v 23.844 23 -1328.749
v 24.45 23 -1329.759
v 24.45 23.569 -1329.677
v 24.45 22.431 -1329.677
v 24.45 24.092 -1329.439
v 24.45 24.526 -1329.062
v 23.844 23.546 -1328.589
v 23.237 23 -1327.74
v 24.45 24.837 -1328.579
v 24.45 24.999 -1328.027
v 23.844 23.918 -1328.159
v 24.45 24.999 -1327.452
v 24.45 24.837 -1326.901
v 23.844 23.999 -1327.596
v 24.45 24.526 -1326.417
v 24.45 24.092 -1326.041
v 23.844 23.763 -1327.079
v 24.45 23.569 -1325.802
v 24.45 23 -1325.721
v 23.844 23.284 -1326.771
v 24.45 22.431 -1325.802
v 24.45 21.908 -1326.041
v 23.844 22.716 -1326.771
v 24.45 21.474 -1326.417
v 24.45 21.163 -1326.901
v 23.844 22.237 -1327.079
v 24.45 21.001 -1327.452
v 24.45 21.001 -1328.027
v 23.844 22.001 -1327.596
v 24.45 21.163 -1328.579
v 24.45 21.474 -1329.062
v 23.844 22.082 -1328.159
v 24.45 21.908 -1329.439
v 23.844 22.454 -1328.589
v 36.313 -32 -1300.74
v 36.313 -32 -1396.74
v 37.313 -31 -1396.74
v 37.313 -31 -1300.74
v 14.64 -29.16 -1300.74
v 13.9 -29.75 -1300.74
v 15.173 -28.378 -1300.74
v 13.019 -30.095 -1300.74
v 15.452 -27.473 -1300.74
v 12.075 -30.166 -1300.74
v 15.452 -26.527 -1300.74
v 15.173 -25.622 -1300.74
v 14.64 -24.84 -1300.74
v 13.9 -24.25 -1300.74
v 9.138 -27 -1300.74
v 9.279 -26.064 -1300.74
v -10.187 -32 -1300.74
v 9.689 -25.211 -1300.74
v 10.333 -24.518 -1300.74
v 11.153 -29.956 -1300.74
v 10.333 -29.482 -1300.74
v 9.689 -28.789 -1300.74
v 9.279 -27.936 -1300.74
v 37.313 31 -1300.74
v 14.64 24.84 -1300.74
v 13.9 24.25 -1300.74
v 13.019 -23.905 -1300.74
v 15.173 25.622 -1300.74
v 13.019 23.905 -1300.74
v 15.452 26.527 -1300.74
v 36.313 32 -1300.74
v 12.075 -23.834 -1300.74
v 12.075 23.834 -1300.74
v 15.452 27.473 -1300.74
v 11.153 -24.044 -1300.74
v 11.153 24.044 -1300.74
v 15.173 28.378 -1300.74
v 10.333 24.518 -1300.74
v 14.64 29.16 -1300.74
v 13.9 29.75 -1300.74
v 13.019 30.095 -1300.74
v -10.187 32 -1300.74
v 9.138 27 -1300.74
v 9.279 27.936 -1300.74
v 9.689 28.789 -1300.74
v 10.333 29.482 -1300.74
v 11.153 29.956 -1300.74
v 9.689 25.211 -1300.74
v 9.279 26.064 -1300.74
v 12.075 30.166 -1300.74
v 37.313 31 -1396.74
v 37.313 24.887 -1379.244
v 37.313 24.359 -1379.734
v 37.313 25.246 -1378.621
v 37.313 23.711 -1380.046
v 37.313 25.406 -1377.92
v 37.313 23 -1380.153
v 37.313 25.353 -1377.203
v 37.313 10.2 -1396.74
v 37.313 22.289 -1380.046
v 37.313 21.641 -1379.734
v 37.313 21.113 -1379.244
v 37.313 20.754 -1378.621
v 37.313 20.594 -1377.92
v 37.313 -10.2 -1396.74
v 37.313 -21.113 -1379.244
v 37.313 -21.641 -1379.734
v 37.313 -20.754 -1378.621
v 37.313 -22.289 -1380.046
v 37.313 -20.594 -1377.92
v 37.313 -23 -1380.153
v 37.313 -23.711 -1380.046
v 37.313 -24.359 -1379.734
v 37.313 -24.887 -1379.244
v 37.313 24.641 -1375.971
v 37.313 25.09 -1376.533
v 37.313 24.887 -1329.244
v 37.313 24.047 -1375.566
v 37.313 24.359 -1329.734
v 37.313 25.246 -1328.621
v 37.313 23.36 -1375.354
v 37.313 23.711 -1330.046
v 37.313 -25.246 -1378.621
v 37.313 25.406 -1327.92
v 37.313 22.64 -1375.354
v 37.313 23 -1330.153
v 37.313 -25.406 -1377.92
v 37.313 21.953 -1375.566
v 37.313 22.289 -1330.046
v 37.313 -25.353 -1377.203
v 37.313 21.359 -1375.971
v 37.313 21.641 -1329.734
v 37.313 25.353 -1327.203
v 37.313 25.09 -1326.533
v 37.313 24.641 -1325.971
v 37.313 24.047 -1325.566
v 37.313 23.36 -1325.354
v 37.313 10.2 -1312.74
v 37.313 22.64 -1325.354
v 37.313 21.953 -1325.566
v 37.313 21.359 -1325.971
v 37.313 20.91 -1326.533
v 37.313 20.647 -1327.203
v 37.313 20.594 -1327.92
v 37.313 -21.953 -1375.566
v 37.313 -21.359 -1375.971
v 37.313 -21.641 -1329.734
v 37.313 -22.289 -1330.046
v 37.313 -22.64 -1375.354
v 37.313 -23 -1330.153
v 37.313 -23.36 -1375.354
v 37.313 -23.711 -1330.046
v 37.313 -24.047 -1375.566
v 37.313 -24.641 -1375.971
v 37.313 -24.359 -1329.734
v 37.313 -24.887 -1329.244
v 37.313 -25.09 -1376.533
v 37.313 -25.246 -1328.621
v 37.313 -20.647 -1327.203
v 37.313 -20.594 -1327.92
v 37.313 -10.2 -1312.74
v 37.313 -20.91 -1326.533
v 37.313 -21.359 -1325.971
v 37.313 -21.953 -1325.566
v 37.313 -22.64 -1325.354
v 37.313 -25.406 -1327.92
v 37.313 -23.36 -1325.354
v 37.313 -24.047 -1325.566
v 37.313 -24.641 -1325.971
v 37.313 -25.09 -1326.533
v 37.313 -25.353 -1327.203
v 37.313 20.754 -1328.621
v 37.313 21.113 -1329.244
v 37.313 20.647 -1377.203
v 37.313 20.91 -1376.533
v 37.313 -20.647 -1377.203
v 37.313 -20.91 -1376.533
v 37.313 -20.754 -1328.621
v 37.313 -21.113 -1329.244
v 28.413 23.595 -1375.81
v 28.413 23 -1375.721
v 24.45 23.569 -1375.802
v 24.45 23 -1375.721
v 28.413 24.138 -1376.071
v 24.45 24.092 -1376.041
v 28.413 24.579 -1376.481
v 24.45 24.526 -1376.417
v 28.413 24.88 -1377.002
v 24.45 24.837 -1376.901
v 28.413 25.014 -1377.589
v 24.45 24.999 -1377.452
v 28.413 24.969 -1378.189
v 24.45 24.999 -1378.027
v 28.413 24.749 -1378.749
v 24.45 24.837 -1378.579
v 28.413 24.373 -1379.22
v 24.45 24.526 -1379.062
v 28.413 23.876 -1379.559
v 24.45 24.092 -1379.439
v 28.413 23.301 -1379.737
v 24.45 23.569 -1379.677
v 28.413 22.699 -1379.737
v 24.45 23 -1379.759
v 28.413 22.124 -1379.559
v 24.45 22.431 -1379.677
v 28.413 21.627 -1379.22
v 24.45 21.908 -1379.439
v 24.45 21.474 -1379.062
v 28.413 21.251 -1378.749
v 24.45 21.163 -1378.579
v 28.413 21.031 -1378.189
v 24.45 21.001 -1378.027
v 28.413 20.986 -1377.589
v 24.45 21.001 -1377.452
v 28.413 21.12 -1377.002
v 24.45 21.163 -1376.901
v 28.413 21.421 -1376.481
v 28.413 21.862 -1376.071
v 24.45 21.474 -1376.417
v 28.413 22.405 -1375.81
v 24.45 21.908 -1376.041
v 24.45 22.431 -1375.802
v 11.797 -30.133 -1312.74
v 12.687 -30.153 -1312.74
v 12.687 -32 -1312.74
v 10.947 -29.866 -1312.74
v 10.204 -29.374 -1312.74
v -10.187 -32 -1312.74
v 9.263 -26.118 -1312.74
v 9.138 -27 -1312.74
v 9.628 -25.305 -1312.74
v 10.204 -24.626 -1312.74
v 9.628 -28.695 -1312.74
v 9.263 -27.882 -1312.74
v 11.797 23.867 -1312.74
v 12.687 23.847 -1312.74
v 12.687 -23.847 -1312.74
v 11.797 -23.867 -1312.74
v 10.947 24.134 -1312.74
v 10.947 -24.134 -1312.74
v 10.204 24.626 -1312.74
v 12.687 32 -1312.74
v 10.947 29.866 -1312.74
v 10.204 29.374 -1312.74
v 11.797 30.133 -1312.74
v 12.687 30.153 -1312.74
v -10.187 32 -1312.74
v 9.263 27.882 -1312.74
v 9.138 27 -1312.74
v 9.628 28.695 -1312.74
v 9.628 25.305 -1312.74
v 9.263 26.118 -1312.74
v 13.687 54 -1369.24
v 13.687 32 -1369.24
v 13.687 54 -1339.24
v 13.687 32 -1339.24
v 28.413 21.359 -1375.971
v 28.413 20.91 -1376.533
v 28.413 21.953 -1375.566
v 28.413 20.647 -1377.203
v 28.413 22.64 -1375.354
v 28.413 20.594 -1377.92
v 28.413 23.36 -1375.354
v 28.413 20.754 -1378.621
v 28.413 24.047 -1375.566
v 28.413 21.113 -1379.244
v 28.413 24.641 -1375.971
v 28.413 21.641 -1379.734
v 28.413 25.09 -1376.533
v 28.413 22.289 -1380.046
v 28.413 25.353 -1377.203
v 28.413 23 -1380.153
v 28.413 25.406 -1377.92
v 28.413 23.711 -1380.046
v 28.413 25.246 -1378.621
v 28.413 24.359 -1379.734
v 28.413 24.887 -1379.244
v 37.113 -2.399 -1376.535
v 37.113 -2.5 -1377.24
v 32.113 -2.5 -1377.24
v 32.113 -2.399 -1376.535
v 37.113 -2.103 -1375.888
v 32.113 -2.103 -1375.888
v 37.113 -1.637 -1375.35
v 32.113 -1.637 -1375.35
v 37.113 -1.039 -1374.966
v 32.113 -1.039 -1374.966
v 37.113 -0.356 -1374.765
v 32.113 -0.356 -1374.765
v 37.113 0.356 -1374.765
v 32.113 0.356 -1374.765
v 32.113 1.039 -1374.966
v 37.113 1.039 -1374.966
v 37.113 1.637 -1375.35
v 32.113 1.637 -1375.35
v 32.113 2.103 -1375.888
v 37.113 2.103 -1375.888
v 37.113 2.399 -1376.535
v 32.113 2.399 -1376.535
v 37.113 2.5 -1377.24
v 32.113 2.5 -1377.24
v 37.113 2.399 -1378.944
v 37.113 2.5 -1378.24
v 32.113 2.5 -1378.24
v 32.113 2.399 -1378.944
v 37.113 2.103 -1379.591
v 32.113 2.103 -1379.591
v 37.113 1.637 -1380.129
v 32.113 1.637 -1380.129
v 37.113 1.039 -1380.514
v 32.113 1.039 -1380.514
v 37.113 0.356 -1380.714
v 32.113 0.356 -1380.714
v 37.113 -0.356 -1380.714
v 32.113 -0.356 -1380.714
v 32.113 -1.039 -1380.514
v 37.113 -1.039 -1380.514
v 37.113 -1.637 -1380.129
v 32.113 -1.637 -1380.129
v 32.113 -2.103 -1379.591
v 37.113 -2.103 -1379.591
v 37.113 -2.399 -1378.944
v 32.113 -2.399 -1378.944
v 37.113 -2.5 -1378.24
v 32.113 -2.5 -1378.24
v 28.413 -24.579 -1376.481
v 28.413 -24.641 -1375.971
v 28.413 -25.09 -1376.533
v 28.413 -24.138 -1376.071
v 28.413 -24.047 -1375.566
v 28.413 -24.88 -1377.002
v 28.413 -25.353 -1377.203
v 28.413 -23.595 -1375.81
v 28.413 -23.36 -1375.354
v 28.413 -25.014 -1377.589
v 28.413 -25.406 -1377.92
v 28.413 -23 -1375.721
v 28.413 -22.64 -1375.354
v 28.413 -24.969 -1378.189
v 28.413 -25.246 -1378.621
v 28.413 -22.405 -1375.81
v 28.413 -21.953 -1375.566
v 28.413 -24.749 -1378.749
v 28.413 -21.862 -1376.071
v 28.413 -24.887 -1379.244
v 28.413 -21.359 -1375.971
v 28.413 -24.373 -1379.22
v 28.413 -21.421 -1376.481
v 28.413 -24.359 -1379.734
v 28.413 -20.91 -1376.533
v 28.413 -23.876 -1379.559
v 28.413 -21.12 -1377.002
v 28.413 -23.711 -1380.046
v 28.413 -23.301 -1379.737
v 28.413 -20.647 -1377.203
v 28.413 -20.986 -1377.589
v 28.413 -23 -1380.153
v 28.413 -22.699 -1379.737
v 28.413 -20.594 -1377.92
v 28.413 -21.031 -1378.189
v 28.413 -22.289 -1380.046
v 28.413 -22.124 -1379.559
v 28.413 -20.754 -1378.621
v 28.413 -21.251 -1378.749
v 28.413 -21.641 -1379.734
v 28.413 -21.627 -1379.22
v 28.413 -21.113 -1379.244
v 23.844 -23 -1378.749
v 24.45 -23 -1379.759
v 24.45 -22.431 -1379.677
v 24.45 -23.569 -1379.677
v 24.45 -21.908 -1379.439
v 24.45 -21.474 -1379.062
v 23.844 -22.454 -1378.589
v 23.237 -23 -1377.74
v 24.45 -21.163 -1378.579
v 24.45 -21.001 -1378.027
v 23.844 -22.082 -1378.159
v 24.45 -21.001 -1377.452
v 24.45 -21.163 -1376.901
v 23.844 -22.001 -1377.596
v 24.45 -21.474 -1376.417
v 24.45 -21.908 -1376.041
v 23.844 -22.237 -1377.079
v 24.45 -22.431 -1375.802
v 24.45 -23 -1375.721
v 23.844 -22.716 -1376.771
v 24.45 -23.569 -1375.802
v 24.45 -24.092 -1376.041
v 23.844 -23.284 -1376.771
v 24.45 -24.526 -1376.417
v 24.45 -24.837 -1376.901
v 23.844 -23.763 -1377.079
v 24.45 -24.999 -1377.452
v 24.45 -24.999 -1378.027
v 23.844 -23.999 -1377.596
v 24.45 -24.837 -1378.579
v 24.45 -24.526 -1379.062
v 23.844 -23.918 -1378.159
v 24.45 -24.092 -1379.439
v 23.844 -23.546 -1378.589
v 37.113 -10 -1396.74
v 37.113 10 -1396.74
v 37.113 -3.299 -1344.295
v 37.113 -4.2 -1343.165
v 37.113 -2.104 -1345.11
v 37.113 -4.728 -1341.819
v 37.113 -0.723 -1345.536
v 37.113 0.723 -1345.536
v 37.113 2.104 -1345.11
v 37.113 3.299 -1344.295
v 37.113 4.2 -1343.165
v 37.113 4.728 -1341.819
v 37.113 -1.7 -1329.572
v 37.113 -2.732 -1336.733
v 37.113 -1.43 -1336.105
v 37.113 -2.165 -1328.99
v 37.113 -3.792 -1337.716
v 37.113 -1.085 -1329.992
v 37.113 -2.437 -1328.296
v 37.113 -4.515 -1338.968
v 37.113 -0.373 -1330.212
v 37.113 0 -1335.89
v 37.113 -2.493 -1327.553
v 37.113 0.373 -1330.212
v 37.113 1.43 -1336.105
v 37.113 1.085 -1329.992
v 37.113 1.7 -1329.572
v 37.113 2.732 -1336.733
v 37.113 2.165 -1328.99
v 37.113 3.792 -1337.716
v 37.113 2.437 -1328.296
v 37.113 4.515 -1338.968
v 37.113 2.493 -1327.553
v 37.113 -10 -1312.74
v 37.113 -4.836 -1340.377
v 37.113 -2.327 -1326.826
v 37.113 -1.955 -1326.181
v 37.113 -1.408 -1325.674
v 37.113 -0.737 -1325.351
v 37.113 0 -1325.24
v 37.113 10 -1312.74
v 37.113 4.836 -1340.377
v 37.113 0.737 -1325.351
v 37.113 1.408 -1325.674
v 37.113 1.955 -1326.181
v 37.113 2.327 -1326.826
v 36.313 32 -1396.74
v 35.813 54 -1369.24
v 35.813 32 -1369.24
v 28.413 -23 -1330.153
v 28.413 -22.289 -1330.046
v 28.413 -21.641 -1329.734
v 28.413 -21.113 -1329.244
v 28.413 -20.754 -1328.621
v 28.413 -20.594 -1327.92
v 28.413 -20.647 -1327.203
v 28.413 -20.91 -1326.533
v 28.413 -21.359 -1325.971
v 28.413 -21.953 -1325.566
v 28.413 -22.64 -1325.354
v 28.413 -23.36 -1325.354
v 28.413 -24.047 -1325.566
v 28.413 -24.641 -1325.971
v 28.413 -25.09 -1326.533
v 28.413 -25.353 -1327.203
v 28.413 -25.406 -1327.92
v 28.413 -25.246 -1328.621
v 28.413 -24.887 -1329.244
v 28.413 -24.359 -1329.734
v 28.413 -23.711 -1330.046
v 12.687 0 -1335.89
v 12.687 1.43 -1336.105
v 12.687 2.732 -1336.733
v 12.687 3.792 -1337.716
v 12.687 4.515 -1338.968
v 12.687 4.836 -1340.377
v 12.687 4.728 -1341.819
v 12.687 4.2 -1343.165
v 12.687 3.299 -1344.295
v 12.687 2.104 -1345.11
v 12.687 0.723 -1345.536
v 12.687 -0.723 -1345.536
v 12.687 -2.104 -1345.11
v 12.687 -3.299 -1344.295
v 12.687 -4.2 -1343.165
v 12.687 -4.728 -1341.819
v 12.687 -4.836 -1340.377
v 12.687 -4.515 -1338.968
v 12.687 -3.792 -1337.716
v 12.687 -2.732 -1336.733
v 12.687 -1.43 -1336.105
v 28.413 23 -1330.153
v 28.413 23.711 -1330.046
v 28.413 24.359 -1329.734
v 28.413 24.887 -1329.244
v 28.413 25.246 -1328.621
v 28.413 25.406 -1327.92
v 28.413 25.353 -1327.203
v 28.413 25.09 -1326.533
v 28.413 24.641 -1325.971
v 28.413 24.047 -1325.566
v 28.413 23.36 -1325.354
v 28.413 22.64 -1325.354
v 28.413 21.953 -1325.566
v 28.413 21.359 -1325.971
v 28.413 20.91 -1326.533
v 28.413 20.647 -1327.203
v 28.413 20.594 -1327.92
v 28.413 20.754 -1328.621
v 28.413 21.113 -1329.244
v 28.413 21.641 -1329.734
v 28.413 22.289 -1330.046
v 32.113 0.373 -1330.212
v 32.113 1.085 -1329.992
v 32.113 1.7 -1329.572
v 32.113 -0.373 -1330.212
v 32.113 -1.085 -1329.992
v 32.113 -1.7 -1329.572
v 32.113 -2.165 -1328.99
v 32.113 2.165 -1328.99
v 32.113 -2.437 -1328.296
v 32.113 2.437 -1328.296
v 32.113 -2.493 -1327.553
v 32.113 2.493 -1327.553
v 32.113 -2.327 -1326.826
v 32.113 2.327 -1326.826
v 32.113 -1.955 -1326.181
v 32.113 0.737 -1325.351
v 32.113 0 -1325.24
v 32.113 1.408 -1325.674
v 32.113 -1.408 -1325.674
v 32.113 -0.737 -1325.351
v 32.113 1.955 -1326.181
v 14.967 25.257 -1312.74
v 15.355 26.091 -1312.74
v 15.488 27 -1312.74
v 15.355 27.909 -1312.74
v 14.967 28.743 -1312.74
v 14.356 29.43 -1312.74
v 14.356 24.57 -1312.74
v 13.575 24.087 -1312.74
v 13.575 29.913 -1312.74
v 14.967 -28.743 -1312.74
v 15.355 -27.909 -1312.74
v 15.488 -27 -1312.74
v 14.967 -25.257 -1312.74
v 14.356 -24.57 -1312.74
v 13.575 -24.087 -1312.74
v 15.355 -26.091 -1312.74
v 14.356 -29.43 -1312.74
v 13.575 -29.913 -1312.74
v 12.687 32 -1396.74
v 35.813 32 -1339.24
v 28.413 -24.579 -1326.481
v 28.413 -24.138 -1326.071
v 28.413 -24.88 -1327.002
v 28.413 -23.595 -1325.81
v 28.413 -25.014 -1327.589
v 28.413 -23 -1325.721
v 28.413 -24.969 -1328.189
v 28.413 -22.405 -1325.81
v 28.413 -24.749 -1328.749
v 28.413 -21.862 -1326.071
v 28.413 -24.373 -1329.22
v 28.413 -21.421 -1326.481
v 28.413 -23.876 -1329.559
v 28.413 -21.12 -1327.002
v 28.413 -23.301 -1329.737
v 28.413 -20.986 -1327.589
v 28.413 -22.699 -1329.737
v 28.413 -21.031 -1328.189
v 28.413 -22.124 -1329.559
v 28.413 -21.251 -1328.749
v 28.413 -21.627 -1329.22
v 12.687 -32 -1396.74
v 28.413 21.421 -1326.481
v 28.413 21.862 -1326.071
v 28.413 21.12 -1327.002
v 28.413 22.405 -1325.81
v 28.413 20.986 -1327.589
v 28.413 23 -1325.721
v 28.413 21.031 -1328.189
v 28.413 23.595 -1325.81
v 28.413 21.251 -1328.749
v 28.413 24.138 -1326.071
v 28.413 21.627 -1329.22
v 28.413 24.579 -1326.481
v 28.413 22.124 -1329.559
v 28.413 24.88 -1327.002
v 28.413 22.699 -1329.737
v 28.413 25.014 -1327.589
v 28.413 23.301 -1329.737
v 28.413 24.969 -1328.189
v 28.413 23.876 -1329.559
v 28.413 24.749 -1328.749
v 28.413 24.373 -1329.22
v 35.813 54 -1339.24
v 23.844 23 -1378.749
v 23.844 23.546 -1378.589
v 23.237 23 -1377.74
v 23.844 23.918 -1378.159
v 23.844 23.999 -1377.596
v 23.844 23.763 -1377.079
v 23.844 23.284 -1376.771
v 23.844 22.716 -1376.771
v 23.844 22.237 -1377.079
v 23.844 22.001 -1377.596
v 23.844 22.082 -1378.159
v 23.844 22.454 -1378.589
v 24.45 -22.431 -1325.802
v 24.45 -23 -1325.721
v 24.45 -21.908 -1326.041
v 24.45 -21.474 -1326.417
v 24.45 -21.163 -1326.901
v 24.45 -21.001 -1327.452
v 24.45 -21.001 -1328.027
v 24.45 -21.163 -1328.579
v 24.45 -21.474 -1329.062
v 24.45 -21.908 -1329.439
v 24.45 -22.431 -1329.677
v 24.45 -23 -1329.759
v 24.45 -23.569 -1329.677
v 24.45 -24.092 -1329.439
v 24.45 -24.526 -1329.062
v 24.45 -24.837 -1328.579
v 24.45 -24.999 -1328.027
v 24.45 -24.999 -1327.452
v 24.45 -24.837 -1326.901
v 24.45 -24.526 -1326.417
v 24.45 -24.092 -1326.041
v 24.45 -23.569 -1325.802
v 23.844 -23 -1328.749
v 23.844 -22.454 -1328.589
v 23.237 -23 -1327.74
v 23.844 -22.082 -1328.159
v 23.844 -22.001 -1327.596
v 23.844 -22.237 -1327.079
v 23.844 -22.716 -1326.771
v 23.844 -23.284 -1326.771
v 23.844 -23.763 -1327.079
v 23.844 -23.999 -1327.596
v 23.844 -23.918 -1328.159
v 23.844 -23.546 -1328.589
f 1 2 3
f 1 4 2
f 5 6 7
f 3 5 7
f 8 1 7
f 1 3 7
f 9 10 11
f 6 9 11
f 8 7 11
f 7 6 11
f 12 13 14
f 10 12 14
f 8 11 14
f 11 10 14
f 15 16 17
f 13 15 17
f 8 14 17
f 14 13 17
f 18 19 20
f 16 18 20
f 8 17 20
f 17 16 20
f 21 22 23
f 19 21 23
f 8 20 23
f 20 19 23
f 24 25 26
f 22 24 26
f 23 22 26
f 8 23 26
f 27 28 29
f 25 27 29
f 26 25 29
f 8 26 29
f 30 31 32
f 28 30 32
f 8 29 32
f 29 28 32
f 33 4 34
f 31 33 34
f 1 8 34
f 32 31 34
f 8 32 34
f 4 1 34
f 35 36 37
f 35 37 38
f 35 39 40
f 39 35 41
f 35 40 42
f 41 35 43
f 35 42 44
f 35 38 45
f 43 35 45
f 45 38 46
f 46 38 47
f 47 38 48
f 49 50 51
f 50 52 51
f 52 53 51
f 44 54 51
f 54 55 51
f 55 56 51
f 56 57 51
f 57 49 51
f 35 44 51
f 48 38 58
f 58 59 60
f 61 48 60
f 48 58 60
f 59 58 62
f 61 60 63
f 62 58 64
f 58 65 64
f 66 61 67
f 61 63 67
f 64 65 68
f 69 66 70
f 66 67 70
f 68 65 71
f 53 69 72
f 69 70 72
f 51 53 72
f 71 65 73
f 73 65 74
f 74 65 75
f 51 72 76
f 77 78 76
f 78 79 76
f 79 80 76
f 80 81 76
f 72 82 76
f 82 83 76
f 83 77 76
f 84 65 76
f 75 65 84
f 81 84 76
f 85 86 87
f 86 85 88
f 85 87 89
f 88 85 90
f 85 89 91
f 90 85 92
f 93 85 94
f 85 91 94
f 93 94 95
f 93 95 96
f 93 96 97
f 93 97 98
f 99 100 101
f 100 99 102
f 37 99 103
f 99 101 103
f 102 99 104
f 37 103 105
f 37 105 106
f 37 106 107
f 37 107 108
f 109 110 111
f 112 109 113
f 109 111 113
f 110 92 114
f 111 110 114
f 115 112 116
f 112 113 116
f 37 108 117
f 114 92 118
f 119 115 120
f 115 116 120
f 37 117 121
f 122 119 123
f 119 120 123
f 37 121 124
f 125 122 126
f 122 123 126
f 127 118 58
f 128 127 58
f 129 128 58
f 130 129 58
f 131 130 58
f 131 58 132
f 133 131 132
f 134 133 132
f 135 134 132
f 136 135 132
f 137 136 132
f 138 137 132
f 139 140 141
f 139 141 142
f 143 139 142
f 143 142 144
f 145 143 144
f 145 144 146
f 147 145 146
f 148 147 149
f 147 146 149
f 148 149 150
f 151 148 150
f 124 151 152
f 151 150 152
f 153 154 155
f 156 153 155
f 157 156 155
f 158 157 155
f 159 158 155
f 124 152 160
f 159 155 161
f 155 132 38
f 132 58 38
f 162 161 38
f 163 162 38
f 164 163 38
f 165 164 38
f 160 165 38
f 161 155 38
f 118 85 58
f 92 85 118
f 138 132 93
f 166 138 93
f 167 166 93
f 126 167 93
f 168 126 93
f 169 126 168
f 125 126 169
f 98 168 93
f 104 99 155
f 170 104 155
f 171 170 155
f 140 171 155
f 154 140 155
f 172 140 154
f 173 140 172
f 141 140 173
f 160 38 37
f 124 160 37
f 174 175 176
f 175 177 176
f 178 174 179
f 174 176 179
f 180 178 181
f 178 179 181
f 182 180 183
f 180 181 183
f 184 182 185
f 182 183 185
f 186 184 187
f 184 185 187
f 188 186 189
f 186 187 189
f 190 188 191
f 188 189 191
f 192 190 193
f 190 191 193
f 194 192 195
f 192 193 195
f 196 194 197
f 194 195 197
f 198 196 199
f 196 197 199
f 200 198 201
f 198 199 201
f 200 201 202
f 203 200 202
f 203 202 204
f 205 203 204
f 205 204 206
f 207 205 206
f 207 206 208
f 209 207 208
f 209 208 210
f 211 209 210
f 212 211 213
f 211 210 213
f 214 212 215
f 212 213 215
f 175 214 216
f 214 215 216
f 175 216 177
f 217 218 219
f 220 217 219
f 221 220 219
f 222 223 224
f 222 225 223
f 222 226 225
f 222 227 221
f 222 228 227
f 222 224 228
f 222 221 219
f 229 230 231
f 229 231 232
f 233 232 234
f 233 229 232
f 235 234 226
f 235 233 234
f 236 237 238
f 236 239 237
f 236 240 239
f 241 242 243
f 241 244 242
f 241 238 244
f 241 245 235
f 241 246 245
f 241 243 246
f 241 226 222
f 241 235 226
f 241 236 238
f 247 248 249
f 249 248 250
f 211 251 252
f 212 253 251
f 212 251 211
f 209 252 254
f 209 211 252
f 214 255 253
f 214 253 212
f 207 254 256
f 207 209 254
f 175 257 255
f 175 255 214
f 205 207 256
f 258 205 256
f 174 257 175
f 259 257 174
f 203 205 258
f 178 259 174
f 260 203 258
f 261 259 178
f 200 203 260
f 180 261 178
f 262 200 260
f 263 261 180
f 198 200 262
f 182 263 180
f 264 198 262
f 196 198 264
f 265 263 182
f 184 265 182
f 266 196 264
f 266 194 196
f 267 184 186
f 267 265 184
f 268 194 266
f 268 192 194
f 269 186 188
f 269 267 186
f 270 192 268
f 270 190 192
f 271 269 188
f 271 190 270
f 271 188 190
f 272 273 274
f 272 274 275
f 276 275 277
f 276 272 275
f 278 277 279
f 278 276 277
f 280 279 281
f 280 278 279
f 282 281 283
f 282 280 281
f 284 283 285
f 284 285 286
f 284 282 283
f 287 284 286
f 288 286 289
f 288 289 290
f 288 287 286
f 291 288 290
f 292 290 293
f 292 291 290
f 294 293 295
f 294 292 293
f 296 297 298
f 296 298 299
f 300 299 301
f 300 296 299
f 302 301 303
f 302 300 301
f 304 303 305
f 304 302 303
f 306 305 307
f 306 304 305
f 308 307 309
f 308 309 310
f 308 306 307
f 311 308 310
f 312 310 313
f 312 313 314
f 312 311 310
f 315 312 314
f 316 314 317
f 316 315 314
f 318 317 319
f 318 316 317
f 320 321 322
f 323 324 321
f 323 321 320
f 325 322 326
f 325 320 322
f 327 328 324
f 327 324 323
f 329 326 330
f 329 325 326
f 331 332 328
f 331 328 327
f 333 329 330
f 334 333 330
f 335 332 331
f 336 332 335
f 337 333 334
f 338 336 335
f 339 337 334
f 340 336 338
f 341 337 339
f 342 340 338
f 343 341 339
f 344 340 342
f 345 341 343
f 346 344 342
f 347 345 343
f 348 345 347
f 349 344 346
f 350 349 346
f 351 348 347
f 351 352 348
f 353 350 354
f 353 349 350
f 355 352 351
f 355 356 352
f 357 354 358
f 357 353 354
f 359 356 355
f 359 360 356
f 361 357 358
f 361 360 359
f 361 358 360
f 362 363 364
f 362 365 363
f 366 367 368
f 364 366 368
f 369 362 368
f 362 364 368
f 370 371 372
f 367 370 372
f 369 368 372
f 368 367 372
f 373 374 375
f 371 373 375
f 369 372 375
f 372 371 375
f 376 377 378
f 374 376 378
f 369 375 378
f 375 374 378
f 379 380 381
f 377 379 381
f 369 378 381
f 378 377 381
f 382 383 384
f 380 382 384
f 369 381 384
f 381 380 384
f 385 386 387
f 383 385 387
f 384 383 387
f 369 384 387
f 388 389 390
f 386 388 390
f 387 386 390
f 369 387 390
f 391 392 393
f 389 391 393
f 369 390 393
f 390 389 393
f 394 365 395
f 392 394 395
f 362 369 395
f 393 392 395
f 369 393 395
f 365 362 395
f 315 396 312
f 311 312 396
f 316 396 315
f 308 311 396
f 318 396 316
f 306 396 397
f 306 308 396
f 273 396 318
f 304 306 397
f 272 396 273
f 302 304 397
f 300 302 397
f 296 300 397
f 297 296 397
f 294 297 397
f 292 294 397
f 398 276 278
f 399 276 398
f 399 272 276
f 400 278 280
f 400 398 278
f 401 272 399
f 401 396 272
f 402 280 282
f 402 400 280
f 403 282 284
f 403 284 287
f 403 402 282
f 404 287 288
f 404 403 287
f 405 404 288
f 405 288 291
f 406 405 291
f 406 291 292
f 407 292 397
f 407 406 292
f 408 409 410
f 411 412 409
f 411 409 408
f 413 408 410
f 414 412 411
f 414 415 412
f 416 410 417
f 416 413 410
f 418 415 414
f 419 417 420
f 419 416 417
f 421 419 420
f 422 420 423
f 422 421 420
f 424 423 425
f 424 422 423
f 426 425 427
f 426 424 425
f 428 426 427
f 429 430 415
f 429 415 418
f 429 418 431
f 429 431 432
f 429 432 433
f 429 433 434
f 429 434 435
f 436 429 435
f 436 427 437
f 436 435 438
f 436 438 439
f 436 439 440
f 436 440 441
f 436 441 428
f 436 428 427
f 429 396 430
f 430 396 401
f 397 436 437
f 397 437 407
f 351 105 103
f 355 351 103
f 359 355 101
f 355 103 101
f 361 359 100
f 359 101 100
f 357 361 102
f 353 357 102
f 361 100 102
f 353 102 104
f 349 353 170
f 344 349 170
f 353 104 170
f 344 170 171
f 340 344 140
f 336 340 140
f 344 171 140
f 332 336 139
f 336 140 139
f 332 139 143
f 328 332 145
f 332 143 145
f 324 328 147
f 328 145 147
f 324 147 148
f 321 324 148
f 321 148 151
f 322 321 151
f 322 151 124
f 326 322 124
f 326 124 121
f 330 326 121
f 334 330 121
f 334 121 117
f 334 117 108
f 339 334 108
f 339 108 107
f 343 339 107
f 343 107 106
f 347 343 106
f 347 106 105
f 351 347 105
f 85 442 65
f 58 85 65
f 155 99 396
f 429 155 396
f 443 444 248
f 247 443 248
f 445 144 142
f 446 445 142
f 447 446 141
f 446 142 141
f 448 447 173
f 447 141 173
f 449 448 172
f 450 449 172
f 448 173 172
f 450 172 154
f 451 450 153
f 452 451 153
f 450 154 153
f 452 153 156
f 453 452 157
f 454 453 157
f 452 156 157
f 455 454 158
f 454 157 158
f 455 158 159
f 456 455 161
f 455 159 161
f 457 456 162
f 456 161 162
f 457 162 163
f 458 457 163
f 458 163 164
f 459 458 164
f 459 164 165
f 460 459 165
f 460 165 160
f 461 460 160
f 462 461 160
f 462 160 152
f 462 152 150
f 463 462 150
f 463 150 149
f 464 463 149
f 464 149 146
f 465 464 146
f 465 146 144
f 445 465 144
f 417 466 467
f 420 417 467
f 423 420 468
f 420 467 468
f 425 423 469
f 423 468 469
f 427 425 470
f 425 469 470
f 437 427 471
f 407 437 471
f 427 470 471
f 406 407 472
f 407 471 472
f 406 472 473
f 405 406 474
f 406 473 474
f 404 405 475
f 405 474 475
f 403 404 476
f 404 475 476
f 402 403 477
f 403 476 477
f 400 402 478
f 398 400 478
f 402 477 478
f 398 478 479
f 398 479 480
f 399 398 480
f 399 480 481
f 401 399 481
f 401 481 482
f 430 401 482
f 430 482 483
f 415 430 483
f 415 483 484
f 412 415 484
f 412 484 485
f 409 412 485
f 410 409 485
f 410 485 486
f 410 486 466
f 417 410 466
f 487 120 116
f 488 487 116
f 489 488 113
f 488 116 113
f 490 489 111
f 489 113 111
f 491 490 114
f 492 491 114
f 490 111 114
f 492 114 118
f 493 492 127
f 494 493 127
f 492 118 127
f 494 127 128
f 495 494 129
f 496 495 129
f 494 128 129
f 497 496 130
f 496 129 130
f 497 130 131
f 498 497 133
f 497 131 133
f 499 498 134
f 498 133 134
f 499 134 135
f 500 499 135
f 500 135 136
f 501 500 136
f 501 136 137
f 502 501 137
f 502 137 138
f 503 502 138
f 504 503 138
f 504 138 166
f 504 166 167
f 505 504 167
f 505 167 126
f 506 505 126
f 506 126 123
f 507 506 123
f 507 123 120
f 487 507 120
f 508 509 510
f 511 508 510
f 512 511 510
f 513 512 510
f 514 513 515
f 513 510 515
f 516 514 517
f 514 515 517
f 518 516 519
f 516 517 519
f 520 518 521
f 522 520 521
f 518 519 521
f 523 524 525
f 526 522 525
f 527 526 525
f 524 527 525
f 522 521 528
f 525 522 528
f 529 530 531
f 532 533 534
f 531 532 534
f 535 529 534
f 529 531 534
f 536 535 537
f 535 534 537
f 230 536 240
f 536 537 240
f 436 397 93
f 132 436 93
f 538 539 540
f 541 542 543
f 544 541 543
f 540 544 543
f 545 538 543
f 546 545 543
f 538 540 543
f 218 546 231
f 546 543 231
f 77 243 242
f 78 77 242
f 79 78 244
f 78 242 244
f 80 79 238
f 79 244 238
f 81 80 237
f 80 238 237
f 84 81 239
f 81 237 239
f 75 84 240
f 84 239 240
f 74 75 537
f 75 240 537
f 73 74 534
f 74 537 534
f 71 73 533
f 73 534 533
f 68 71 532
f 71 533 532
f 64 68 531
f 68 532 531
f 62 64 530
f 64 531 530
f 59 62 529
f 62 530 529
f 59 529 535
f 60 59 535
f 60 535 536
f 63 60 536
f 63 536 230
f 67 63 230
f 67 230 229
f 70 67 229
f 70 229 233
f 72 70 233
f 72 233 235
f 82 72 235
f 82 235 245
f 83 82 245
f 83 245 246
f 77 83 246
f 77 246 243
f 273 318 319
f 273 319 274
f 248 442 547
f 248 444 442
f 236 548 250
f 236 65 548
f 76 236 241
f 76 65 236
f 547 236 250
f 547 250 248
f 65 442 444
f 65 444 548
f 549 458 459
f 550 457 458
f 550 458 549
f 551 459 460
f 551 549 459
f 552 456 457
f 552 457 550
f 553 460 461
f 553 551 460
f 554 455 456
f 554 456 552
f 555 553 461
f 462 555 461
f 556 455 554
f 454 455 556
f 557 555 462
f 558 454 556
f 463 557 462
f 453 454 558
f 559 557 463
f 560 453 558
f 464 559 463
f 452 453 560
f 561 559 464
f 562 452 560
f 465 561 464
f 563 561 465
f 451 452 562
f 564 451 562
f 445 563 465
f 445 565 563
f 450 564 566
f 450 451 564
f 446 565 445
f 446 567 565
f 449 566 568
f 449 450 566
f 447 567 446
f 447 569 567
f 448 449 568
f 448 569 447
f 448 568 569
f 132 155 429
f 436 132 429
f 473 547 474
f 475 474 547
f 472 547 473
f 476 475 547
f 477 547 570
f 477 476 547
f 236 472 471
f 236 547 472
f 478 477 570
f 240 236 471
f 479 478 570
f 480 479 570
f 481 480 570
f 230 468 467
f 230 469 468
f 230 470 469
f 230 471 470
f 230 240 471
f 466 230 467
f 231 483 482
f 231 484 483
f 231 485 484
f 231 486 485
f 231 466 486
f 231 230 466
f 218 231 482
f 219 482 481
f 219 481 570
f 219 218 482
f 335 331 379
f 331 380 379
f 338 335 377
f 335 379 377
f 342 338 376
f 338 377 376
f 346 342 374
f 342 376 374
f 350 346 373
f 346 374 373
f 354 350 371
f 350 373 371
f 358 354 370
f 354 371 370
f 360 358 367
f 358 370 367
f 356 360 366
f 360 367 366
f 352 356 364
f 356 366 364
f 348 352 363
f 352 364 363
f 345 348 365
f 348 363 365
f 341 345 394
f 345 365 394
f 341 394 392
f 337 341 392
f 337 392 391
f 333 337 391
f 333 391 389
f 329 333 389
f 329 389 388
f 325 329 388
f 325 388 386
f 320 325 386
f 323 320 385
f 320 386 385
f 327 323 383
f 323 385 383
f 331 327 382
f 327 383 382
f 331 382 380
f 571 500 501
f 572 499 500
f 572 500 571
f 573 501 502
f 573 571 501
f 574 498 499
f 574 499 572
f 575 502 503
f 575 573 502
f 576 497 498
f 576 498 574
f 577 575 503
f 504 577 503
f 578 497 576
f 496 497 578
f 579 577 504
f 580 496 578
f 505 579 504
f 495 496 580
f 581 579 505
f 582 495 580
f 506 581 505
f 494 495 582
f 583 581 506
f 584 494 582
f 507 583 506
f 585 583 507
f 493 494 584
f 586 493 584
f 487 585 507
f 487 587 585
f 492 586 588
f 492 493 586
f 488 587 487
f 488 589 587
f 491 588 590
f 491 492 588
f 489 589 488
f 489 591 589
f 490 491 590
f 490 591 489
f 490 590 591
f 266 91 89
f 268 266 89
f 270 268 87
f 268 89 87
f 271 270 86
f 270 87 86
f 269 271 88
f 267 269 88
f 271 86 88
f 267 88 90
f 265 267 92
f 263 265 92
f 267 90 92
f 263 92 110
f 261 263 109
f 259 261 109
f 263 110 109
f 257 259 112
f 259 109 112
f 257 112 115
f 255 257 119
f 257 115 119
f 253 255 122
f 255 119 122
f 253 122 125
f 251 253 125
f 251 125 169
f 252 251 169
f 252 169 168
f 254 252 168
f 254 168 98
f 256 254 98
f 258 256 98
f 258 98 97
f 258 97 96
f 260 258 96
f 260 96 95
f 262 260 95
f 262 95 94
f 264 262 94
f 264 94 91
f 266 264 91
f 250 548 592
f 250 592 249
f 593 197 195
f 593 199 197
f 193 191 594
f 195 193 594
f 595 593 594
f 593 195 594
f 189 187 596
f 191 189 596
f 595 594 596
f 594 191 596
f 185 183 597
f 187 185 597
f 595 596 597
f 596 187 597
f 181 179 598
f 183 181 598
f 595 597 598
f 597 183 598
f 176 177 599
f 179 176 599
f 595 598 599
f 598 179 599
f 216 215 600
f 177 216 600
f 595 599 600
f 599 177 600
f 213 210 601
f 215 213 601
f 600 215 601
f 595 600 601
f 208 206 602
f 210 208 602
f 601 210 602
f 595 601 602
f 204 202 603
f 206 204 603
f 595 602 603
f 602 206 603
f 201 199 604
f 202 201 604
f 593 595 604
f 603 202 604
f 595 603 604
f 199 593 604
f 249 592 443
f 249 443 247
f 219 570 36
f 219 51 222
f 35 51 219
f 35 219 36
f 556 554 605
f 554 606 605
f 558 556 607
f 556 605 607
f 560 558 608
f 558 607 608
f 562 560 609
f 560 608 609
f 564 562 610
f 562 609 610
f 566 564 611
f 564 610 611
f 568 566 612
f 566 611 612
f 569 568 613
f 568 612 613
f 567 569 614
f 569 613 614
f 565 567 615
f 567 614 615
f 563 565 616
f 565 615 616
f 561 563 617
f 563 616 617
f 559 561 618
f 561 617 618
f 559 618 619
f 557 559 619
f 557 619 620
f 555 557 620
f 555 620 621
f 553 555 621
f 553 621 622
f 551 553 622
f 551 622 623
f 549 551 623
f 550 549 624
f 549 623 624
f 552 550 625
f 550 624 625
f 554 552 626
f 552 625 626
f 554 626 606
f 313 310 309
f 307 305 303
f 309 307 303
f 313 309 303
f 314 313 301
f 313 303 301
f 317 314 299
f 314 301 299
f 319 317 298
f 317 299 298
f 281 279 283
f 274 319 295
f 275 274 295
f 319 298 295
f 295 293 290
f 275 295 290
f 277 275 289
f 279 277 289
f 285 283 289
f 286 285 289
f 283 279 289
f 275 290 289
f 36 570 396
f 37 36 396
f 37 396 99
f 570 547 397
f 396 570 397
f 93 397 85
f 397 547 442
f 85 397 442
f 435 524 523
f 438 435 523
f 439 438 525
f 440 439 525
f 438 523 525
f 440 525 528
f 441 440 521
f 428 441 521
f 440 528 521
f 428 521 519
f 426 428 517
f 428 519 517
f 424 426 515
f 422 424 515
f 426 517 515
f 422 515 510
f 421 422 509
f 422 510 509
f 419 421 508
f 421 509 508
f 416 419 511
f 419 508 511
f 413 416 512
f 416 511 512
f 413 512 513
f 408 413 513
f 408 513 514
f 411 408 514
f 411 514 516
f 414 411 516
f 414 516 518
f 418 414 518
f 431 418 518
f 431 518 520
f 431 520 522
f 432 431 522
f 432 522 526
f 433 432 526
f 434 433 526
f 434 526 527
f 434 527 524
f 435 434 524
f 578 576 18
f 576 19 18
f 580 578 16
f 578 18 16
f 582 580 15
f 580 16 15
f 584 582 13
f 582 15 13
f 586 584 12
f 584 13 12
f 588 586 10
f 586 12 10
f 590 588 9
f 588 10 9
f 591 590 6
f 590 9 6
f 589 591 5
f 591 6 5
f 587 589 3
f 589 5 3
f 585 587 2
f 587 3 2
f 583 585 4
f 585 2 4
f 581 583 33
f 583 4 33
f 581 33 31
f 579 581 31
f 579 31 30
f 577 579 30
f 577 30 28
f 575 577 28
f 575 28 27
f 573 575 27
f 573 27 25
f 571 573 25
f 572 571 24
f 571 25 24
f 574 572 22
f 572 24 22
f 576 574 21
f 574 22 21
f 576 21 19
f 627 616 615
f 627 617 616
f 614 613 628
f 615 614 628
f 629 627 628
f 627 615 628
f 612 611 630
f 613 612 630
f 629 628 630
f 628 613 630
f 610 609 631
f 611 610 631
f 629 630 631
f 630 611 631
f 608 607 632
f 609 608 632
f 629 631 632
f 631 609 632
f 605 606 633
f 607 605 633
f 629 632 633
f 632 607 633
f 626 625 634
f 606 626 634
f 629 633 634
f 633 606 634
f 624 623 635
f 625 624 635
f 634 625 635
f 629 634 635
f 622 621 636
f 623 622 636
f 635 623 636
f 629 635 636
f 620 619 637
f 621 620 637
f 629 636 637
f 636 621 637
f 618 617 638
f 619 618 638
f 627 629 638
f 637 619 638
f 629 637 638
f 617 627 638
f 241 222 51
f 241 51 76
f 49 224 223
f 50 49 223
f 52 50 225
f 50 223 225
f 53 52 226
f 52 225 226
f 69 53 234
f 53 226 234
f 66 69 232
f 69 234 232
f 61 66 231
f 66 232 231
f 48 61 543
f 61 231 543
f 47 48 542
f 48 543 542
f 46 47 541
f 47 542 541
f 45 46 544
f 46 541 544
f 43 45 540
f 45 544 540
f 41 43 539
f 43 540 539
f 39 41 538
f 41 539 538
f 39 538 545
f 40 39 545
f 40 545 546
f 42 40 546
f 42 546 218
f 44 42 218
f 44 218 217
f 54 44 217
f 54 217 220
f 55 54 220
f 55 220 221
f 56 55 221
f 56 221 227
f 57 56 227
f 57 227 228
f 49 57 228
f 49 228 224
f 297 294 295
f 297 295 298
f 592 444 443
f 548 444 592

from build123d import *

# Parameters (mm, degrees)
BASE_EXTRUDE_DEPTH               = 12
BOSS_EXTRUDE1_DEPTH              = 84
BOSS_EXTRUDE3_DEPTH              = 12
F_9_7_DIAMETER_HOLE1_D           = 9.7
F_10_32_TAPPED_HOLE1_D           = 4.0386
F_10_32_TAPPED_HOLE1_DEPTH       = 12.8624
F_10_32_TAPPED_HOLE1_CBORE_D     = 4.826
F_10_32_TAPPED_HOLE1_CBORE_DEPTH = 8.9
F_10_32_TAPPED_HOLE1_TIP         = 1.213317848
F_1_4_20_TAPPED_HOLE1_D          = 6.35
F_1_4_20_TAPPED_HOLE1_DEPTH      = 12
CUT_EXTRUDE1_DEPTH               = 5
HOLE1_D                          = 5
HOLE1_DEPTH                      = 5
SKETCH14_W                       = 22.1254
SKETCH14_H                       = 30
BOSS_EXTRUDE2_DEPTH              = 22
CHAMFER1_SIZE                    = 1


with BuildPart() as part:
    # Sketch1 → Base-Extrude (new body)
    with BuildSketch(Plane.XY.offset(-1312.73981158)):
        Polygon((-10.1873, 32), (37.3127, 32), (37.3127, 10.2), (37.1127, 10), (37.1127, -10), (37.3127, -10.2), (37.3127, -32), (-10.1873, -32), align=None)
    extrude(amount=BASE_EXTRUDE_DEPTH)

    # Sketch3 → Boss-Extrude1 (add)
    with BuildSketch(Plane(origin=(0, 0, -1312.73981158), x_dir=(-1, 0, 0), z_dir=(0, 0, -1))):
        Polygon((-37.3127, 10.2), (-37.3127, 32), (-12.6873, 32), (-12.6873, -32), (-37.3127, -32), (-37.3127, -10.2), (-37.1127, -10), (-37.1127, 10), align=None)
    extrude(amount=BOSS_EXTRUDE1_DEPTH)

    # Sketch15 → Boss-Extrude3 (add)
    with BuildSketch(Plane.XY.offset(-1300.73981158)):
        Polygon((37.1127, -10), (37.1127, 10), (37.3127, 10.2), (37.3127, -10.2), align=None)
    extrude(amount=-BOSS_EXTRUDE3_DEPTH)

    # 9.7 Diameter Hole1 (through all)
    with Locations(Plane(origin=(37.1127, 0, 0), x_dir=(0, 0, -1), z_dir=(1, 0, 0))):
        with Locations((1340.73981158, 0)):
            Hole(F_9_7_DIAMETER_HOLE1_D / 2)

    # #10-32 Tapped Hole1
    with Locations(Plane(origin=(37.3127, 0, 0), x_dir=(0, 0, -1), z_dir=(1, 0, 0))):
        with Locations((1327.73981158, 23), (1377.73981158, 23), (1327.73981158, -23), (1377.73981158, -23)):
            CounterBoreHole(F_10_32_TAPPED_HOLE1_D / 2, F_10_32_TAPPED_HOLE1_CBORE_D / 2, F_10_32_TAPPED_HOLE1_CBORE_DEPTH, depth=F_10_32_TAPPED_HOLE1_DEPTH)
            with Locations((0, 0, -(F_10_32_TAPPED_HOLE1_DEPTH + F_10_32_TAPPED_HOLE1_TIP / 2))):  # 118° drill point
                Cone(0, F_10_32_TAPPED_HOLE1_D / 2, F_10_32_TAPPED_HOLE1_TIP, mode=Mode.SUBTRACT)

    # 1/4-20 Tapped Hole1
    with Locations(Plane.XY.offset(-1300.73981158)):
        with Locations((12.3127, 27), (12.3127, -27)):
            Hole(F_1_4_20_TAPPED_HOLE1_D / 2, depth=F_1_4_20_TAPPED_HOLE1_DEPTH)

    # Sketch11 → Cut-Extrude1 (cut)
    with BuildSketch(Plane(origin=(37.1127, 0, 0), x_dir=(0, 0, -1), z_dir=(1, 0, 0))):
        with BuildLine():
            Line((1377.23981158, 2.5), (1378.23981158, 2.5))
            ThreePointArc((1378.23981158, 2.5), (1380.73981158, 0), (1378.23981158, -2.5))
            Line((1378.23981158, -2.5), (1377.23981158, -2.5))
            ThreePointArc((1377.23981158, -2.5), (1374.73981158, 0), (1377.23981158, 2.5))
        make_face()
    extrude(amount=-CUT_EXTRUDE1_DEPTH, mode=Mode.SUBTRACT)

    # Hole1
    with Locations(Plane(origin=(37.1127, 0, 0), x_dir=(0, 0, -1), z_dir=(1, 0, 0))):
        with Locations((1327.73981158, 0)):
            Hole(HOLE1_D / 2, depth=HOLE1_DEPTH)

    # Sketch14 → Boss-Extrude2 (add)
    with BuildSketch(Plane(origin=(0, 32, 0), x_dir=(-1, 0, 0), z_dir=(0, 1, 0))):
        with Locations((-24.75, -1354.23981158)):
            Rectangle(SKETCH14_W, SKETCH14_H)
    extrude(amount=BOSS_EXTRUDE2_DEPTH)

    # Chamfer1
    chamfer1_edges = [part.edges().sort_by_distance(p)[0] for p in [
        (37.3127, -32, -1348.73981158),
        (37.3127, 32, -1348.73981158),
    ]]
    chamfer(chamfer1_edges, length=CHAMFER1_SIZE)


solid = part.part
